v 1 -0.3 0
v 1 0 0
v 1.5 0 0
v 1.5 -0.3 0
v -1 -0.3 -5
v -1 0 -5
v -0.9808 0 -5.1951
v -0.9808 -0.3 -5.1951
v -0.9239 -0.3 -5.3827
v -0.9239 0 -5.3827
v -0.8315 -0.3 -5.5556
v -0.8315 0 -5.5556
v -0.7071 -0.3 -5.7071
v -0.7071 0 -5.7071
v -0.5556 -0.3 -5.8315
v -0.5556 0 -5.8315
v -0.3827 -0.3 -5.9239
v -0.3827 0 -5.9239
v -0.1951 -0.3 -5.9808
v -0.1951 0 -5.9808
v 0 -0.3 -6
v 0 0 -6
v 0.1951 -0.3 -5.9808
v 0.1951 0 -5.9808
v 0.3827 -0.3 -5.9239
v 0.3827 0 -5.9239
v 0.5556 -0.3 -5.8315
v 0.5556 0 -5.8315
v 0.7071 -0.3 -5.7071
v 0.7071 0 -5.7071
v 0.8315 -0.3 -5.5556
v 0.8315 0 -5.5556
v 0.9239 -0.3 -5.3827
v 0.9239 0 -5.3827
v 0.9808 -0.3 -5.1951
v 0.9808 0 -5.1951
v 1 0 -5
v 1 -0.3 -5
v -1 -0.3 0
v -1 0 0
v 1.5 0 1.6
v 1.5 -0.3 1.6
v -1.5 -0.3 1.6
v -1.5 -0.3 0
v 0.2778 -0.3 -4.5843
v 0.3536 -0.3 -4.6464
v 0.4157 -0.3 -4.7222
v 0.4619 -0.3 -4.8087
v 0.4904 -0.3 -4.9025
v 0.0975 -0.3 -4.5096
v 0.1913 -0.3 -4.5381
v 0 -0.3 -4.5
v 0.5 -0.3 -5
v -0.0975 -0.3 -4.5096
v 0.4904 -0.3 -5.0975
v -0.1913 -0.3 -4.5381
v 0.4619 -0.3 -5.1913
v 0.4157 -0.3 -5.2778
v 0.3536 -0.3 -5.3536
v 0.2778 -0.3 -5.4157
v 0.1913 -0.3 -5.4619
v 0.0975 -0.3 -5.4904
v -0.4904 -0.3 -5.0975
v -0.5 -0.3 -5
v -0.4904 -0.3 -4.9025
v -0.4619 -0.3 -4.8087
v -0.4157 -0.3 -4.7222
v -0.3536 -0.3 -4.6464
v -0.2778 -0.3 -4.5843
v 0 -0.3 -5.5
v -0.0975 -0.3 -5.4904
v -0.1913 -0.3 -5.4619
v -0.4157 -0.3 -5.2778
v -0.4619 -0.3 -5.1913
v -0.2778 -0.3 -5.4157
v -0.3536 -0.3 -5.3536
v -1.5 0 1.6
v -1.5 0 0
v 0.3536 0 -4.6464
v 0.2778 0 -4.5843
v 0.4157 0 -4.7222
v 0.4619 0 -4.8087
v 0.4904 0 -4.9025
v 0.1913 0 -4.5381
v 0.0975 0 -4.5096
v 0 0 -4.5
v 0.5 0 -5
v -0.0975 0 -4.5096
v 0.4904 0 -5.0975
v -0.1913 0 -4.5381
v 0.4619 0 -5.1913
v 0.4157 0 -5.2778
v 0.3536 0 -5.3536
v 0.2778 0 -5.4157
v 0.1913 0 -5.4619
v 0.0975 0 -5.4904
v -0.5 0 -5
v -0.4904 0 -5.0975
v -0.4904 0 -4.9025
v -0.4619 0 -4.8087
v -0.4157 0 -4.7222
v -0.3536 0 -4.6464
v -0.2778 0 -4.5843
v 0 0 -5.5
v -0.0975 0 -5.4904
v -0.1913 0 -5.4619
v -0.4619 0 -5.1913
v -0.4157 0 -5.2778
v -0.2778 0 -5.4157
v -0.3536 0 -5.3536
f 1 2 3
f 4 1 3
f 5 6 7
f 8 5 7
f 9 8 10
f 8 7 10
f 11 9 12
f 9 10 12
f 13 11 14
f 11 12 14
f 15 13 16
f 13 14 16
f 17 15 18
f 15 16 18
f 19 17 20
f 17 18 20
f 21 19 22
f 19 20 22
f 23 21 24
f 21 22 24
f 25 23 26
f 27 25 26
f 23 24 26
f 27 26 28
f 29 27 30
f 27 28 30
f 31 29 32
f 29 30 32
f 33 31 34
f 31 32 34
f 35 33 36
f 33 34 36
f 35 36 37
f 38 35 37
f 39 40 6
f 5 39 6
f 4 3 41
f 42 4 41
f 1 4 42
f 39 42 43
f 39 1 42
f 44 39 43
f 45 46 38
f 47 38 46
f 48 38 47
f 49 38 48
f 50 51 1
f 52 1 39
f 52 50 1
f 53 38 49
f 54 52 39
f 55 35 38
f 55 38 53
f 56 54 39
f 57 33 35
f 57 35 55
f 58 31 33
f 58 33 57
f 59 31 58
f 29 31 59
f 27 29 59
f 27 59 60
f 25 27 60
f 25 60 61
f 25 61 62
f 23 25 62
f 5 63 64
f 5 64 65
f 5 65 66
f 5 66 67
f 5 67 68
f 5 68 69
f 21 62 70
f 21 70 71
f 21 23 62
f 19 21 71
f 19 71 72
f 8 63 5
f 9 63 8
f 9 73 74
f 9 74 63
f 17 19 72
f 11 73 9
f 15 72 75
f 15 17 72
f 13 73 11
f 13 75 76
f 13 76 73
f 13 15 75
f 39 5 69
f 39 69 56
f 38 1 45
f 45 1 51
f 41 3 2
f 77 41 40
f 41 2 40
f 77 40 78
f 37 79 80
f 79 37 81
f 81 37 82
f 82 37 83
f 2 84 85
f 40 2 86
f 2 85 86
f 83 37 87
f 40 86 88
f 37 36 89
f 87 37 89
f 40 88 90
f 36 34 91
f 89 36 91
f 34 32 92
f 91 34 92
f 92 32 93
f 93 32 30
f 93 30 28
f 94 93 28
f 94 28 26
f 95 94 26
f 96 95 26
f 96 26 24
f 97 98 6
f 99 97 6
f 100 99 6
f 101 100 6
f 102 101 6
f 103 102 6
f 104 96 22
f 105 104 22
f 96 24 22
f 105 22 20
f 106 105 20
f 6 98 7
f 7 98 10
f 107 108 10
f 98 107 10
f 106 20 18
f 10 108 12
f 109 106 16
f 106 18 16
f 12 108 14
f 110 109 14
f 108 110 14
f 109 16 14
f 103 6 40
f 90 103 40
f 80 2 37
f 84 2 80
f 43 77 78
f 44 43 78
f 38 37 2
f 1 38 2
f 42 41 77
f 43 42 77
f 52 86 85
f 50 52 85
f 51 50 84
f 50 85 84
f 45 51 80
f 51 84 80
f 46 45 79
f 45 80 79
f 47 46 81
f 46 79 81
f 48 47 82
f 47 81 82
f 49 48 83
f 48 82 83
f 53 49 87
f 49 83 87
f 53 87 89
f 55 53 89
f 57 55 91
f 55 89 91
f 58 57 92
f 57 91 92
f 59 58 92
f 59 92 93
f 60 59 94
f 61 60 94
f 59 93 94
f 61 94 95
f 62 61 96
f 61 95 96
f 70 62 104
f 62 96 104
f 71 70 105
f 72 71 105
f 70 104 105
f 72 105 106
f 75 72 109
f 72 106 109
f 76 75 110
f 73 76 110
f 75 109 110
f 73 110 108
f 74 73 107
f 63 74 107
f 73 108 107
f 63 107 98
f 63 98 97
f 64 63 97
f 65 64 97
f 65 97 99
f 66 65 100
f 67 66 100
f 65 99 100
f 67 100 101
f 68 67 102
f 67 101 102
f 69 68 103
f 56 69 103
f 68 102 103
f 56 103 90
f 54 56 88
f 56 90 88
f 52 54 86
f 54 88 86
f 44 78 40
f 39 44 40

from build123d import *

# Parameters (mm, degrees)
SKETCH1_R          = 0.5
BASE_FLANGE1_DEPTH = 0.3


# Sheet-metal steps are written as plain solids
with BuildPart() as part:
    # Sketch1 → Base-Flange1 (new body)
    with BuildSketch(Plane(origin=(0, 0, 0), x_dir=(1, 0, 0), z_dir=(0, 1, 0))):
        with BuildLine():
            Line((-1, 0), (-1, 5))
            ThreePointArc((-1, 5), (0, 6), (1, 5))
            Line((1, 5), (1, 0))
            Line((1, 0), (1.5, 0))
            Line((1.5, 0), (1.5, -1.6))
            Line((1.5, -1.6), (-1.5, -1.6))
            Line((-1.5, -1.6), (-1.5, 0))
            Line((-1.5, 0), (-1, 0))
        make_face()
        with Locations(Location((0, 5, 0), (0, 0, 270))):
            Circle(SKETCH1_R, mode=Mode.SUBTRACT)
    extrude(amount=-BASE_FLANGE1_DEPTH)


solid = part.part
